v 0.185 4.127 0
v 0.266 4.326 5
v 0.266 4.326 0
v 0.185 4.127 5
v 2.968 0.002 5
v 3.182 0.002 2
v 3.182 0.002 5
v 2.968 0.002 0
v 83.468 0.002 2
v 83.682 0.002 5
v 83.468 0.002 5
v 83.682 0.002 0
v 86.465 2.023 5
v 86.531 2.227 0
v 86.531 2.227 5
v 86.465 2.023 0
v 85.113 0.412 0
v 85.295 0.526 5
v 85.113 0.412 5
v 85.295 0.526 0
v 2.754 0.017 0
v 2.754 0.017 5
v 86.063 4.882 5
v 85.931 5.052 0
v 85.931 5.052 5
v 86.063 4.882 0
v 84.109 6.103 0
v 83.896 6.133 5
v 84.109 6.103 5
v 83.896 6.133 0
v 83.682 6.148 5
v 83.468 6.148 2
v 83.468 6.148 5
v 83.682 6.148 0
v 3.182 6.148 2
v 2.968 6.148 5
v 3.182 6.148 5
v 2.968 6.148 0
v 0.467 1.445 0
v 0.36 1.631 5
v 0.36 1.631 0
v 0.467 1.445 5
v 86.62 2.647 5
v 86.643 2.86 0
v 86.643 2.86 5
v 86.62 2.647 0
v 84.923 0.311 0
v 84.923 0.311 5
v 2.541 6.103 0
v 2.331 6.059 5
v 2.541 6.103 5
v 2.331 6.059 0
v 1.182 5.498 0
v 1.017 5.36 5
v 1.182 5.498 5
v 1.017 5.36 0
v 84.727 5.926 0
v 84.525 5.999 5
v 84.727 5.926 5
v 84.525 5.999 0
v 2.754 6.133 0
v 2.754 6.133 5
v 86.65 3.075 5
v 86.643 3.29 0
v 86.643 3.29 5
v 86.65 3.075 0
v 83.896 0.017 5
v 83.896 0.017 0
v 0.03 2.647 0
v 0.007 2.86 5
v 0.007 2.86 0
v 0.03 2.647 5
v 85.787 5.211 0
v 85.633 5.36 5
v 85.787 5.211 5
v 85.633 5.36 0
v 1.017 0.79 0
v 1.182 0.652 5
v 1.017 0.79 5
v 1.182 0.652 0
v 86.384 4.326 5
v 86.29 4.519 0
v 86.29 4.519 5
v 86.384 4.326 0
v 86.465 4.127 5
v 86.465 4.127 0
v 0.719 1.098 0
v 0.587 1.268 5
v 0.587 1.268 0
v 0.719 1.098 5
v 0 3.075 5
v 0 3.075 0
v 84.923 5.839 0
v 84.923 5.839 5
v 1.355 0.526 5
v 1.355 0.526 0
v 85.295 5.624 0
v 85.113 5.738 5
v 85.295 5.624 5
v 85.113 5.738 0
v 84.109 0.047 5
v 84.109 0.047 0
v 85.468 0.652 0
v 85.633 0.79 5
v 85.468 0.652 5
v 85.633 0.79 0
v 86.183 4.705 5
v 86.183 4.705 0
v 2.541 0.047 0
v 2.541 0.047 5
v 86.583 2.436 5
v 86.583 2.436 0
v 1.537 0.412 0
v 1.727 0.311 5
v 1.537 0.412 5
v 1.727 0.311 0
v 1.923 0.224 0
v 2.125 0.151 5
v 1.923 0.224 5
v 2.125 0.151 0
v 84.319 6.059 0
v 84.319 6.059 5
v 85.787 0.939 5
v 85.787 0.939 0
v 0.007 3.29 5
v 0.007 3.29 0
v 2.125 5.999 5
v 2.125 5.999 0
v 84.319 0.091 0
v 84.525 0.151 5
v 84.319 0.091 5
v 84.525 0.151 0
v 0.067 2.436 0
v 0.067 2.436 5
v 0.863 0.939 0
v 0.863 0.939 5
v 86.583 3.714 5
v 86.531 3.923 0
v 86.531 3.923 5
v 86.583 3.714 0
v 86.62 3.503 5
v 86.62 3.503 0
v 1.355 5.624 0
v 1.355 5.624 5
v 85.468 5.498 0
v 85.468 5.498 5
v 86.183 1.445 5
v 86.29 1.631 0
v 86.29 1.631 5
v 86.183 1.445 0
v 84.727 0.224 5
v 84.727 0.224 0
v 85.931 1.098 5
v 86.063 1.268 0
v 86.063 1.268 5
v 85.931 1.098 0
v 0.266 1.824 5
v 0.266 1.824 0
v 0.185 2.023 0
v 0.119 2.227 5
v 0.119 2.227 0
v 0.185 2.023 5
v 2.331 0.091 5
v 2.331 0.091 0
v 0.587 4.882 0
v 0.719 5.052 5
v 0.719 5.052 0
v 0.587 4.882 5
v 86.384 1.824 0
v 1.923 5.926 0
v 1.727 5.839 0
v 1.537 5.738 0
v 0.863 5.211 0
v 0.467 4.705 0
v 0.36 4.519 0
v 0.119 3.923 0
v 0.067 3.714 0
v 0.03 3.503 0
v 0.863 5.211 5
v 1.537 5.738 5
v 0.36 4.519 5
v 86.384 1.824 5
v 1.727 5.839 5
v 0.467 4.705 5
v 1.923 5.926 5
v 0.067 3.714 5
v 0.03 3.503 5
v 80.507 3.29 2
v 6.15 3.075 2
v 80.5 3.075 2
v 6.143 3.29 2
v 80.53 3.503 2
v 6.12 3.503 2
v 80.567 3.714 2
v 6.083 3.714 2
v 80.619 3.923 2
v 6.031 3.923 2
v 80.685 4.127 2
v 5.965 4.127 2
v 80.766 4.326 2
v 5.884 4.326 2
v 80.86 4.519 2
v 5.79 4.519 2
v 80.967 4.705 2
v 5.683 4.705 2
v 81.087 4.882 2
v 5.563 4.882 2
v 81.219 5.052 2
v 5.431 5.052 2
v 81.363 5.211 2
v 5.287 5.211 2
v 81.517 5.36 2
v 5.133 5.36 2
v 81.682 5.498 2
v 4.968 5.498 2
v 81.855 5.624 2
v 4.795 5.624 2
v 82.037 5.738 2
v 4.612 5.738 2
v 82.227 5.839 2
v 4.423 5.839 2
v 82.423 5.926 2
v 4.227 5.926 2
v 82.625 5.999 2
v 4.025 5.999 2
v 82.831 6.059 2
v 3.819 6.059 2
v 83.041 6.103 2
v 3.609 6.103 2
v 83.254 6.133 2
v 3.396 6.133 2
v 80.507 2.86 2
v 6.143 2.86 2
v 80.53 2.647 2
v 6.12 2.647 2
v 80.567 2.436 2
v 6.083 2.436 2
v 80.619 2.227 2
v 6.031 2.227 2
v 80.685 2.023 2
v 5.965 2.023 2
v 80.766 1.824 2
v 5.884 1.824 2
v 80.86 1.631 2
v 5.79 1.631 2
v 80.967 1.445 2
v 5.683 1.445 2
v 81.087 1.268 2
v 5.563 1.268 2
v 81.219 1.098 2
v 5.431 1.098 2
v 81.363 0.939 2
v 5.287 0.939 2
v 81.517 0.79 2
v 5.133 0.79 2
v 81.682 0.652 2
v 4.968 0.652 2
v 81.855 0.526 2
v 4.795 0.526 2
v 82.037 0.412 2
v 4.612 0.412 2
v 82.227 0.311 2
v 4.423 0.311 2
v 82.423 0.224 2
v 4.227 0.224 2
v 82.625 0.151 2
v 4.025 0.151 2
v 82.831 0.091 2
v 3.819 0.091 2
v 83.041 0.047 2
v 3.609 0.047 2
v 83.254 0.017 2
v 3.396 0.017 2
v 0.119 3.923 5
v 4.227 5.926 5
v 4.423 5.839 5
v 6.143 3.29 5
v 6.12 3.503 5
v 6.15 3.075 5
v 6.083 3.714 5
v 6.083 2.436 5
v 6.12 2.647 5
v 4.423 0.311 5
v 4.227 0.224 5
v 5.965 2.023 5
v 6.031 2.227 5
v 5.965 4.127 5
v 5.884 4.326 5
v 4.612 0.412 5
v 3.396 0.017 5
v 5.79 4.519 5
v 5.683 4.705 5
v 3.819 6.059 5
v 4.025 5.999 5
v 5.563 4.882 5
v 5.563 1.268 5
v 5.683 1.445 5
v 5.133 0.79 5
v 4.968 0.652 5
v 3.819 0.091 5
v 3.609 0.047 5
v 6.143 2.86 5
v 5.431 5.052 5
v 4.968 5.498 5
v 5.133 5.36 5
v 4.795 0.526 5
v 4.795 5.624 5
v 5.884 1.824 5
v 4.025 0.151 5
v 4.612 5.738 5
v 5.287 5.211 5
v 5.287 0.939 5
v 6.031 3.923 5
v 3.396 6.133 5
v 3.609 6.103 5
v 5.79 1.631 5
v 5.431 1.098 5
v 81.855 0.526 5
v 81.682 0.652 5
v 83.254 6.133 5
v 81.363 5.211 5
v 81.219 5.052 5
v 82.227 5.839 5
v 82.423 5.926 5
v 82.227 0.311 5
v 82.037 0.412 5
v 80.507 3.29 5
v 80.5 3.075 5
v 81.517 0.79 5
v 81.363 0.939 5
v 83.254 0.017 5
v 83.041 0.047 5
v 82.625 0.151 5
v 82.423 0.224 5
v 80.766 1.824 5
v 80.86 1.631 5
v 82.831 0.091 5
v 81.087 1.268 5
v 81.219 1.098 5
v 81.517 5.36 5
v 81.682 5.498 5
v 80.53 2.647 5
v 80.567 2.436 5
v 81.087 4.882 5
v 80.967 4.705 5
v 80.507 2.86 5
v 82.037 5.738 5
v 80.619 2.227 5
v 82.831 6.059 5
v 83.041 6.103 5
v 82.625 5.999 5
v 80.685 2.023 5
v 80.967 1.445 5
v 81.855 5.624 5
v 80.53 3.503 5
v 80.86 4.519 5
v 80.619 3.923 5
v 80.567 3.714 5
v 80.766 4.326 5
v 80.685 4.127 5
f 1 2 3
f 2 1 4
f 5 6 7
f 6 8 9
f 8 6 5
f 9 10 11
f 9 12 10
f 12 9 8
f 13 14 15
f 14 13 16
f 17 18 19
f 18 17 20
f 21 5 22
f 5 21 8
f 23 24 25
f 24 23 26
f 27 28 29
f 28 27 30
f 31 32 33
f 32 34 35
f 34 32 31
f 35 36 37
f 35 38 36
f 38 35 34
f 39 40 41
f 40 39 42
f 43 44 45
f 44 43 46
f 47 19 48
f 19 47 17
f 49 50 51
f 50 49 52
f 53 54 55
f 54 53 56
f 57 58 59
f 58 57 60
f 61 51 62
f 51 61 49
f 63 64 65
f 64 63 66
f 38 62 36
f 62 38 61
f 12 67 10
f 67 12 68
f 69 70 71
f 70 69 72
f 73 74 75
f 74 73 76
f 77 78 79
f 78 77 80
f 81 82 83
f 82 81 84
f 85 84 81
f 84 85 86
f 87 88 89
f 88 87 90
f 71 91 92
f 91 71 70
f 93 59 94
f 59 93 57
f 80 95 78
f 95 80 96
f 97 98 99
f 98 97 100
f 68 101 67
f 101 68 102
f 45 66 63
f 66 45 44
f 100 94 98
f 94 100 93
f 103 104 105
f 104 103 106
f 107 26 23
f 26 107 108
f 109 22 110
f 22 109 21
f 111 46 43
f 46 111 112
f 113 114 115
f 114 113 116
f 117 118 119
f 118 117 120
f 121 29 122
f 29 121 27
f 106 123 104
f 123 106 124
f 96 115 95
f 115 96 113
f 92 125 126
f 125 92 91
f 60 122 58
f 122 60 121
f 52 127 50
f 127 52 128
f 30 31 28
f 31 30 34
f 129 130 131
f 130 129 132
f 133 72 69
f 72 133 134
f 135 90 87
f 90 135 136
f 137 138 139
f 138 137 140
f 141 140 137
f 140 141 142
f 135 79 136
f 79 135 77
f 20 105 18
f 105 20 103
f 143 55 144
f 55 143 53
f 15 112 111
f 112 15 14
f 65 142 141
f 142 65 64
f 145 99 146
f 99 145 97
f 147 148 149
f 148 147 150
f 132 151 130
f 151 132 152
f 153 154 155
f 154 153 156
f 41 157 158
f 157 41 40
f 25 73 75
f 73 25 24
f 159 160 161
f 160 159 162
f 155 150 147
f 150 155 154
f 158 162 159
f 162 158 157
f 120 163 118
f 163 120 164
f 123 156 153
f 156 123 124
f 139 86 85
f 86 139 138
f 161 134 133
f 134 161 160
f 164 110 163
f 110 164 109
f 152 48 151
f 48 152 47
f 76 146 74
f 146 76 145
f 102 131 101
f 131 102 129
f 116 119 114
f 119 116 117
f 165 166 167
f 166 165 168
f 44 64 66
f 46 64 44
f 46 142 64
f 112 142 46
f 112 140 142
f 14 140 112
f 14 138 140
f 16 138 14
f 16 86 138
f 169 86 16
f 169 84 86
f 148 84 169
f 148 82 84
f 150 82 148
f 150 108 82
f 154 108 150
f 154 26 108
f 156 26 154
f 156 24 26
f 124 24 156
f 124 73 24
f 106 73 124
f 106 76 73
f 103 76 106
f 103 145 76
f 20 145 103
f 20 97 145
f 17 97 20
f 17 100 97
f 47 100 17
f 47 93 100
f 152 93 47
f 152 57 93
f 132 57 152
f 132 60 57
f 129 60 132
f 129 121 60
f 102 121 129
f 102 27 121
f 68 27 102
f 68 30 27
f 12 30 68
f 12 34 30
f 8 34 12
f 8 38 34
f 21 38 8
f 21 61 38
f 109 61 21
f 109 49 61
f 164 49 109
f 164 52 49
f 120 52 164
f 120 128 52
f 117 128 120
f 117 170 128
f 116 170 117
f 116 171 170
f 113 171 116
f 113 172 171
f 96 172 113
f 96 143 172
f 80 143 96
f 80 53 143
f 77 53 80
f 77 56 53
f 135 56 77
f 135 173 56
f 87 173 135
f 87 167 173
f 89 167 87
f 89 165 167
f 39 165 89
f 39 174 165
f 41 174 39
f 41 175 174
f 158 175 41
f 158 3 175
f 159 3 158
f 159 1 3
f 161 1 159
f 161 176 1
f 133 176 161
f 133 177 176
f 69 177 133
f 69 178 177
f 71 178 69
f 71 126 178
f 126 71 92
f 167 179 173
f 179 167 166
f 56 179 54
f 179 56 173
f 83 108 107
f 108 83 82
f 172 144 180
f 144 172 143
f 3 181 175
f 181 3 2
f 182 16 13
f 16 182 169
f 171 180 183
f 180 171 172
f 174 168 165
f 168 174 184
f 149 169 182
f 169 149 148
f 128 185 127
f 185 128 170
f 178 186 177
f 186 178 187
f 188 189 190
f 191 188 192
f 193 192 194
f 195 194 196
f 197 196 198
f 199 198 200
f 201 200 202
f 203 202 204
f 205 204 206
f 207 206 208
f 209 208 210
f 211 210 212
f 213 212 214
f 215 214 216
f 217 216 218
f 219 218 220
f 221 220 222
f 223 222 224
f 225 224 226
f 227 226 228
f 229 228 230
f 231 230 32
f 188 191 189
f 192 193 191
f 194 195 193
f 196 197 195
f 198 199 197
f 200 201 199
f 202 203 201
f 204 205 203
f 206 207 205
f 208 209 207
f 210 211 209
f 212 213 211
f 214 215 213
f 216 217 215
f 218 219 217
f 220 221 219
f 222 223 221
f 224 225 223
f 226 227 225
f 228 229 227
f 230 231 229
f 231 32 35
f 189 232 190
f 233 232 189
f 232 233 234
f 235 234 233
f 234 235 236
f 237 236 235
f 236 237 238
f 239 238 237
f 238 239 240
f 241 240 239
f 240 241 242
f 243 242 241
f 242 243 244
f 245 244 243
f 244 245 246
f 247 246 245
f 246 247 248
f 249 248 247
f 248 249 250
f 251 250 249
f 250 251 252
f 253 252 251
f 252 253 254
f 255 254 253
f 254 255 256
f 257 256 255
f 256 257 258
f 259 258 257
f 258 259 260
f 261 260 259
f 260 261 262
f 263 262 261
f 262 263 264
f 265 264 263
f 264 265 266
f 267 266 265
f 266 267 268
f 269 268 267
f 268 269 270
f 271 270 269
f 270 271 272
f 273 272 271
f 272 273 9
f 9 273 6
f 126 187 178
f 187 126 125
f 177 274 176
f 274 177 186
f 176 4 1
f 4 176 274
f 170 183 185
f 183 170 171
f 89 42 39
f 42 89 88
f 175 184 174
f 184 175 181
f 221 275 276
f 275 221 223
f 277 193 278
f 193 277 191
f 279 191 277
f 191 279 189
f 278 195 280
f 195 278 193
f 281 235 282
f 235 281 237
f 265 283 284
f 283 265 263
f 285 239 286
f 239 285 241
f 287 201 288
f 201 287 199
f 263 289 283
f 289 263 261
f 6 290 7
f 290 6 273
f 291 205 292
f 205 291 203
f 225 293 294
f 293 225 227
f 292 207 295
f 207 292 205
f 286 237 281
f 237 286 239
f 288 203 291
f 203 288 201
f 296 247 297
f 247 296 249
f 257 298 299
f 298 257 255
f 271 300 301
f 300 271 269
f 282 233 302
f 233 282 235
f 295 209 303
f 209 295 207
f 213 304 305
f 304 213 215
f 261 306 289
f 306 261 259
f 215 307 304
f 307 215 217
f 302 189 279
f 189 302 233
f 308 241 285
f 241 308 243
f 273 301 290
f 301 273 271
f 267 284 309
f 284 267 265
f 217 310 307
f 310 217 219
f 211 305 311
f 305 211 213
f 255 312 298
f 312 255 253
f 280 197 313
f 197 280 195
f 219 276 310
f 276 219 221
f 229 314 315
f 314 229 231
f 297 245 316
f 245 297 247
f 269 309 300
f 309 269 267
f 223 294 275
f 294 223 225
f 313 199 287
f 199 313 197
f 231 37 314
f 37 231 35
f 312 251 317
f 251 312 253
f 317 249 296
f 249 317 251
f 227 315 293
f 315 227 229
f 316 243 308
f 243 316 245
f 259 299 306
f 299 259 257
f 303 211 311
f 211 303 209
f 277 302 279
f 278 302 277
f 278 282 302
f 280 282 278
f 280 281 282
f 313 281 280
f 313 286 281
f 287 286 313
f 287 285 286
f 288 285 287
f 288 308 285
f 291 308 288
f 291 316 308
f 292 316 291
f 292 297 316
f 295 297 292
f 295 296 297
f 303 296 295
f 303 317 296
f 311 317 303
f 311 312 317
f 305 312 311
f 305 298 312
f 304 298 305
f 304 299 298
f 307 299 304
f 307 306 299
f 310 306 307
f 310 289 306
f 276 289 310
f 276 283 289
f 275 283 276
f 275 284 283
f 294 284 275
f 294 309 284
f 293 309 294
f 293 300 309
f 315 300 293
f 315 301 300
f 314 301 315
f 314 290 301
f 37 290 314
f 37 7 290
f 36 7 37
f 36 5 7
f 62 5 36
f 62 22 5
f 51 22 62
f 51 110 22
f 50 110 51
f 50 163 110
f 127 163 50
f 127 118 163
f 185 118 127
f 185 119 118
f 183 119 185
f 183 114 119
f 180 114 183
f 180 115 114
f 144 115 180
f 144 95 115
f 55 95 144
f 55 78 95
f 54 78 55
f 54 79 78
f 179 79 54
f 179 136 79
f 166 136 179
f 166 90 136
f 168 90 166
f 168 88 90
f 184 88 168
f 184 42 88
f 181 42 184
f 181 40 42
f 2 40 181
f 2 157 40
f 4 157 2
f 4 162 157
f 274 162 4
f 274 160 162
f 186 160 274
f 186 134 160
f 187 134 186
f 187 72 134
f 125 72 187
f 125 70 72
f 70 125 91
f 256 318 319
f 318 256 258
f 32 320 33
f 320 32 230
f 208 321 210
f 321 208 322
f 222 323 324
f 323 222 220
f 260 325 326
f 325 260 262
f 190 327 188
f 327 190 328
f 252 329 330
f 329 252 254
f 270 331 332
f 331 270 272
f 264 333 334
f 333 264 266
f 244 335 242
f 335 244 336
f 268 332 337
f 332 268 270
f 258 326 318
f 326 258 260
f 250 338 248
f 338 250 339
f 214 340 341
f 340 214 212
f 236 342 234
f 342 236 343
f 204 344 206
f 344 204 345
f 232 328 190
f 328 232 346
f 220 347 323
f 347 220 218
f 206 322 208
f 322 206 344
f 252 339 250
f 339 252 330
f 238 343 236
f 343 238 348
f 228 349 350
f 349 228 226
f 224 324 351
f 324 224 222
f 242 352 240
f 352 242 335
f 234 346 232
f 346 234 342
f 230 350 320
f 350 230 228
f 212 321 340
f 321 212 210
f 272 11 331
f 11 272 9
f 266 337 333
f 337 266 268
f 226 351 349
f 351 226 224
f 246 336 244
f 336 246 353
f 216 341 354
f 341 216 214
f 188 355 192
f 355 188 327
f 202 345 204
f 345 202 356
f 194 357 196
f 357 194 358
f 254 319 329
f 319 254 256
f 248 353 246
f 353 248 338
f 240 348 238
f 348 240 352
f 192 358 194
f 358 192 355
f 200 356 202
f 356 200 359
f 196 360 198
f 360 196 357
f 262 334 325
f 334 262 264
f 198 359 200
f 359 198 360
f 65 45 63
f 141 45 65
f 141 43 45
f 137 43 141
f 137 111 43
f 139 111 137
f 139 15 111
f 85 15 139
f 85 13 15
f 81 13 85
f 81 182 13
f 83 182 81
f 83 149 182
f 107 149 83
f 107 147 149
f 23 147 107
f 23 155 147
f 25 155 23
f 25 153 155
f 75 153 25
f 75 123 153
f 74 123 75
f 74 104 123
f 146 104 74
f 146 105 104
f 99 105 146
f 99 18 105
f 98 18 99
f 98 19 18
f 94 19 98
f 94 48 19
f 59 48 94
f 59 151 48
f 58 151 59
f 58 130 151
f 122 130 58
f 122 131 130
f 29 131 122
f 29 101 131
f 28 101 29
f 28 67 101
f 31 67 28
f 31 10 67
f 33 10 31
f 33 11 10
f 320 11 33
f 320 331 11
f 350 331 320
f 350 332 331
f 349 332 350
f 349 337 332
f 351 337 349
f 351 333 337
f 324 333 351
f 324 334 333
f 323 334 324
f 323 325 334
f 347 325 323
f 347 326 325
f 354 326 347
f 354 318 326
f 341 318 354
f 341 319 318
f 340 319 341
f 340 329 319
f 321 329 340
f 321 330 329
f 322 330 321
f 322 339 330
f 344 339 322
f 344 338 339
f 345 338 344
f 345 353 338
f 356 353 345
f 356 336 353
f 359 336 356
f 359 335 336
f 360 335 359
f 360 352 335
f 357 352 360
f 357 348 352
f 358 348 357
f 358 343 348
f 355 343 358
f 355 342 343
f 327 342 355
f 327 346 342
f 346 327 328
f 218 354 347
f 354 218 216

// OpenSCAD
// file: round_corners.scad
module round_cube (x=40,y=30,z=2,d=10)
{
    assert(x >= d && y >= d, str("given diameter(d=",d,") exceed one of sides(x=",x,",y=",y,")! Use round_cube_lazy to automatically choose diameter."));
    
    A = x-d;
    B = y-d;
    C = z;
    
    translate([d/2,d/2,0])
    hull()
    {
        cylinder(d=d, h=C);
        translate([A,0,0]) cylinder(d=d, h=C);
        translate([A,B,0]) cylinder(d=d, h=C);
        translate([0,B,0]) cylinder(d=d, h=C);
    }   
}

//round_cube(x=5,y=10,d=20);

module round_cube_lazy(x=40,y=30,z=2,d=10)
{
    if (x<d || y<d)
    {
        echo("Avoiding dissaster by choosing new diameter.");
    }
    
    _d = min([x,y,d]);
    round_cube(x,y,z,_d);
}

round_cube_lazy(x=5,y=10,d=20);

$fn = 90;
module box (x=82,y=154,z=52,d=20,t=2)
{
    A = x-d;
    B = y-d;
    C = z;
    
    //%translate([-d/2,-d/2,0]) cube([x,y,z]);
    difference()
    {
        hull()
        {
            cylinder(d=d, h=C);
            translate([A,0,0]) cylinder(d=d, h=C);
            translate([A,B,0]) cylinder(d=d, h=C);
            translate([0,B,0]) cylinder(d=d, h=C);
        }
        
        translate([-t/2,-t/2,t])
        hull()
        {
            translate([t,t,0]) cylinder(d=d-t, h=C);
            translate([A,t,0]) cylinder(d=d-t, h=C);
            translate([A,B,0]) cylinder(d=d-t, h=C);
            translate([t,B,0]) cylinder(d=d-t, h=C);
        }
    }
}

//box();
// main file
use<round_corners.scad>;

// general parameters
$fn = 90;
eps = 0.01;
tol = 0.5;
t_tol = 0.1;

// plate parameters
p_d = 6.15;
p_t = 2;
p_h = 3;
p_x = 80.5;

module pipet_hooks()
{
    round_cube(x=p_x+p_d,y=p_d,z=p_t,d=p_d);
    translate([p_d/2,p_d/2,p_t]) cylinder(d=p_d, h=p_h);
    translate([p_x+p_d/2,p_d/2,p_t]) cylinder(d=p_d, h=p_h);
    
}

pipet_hooks();
